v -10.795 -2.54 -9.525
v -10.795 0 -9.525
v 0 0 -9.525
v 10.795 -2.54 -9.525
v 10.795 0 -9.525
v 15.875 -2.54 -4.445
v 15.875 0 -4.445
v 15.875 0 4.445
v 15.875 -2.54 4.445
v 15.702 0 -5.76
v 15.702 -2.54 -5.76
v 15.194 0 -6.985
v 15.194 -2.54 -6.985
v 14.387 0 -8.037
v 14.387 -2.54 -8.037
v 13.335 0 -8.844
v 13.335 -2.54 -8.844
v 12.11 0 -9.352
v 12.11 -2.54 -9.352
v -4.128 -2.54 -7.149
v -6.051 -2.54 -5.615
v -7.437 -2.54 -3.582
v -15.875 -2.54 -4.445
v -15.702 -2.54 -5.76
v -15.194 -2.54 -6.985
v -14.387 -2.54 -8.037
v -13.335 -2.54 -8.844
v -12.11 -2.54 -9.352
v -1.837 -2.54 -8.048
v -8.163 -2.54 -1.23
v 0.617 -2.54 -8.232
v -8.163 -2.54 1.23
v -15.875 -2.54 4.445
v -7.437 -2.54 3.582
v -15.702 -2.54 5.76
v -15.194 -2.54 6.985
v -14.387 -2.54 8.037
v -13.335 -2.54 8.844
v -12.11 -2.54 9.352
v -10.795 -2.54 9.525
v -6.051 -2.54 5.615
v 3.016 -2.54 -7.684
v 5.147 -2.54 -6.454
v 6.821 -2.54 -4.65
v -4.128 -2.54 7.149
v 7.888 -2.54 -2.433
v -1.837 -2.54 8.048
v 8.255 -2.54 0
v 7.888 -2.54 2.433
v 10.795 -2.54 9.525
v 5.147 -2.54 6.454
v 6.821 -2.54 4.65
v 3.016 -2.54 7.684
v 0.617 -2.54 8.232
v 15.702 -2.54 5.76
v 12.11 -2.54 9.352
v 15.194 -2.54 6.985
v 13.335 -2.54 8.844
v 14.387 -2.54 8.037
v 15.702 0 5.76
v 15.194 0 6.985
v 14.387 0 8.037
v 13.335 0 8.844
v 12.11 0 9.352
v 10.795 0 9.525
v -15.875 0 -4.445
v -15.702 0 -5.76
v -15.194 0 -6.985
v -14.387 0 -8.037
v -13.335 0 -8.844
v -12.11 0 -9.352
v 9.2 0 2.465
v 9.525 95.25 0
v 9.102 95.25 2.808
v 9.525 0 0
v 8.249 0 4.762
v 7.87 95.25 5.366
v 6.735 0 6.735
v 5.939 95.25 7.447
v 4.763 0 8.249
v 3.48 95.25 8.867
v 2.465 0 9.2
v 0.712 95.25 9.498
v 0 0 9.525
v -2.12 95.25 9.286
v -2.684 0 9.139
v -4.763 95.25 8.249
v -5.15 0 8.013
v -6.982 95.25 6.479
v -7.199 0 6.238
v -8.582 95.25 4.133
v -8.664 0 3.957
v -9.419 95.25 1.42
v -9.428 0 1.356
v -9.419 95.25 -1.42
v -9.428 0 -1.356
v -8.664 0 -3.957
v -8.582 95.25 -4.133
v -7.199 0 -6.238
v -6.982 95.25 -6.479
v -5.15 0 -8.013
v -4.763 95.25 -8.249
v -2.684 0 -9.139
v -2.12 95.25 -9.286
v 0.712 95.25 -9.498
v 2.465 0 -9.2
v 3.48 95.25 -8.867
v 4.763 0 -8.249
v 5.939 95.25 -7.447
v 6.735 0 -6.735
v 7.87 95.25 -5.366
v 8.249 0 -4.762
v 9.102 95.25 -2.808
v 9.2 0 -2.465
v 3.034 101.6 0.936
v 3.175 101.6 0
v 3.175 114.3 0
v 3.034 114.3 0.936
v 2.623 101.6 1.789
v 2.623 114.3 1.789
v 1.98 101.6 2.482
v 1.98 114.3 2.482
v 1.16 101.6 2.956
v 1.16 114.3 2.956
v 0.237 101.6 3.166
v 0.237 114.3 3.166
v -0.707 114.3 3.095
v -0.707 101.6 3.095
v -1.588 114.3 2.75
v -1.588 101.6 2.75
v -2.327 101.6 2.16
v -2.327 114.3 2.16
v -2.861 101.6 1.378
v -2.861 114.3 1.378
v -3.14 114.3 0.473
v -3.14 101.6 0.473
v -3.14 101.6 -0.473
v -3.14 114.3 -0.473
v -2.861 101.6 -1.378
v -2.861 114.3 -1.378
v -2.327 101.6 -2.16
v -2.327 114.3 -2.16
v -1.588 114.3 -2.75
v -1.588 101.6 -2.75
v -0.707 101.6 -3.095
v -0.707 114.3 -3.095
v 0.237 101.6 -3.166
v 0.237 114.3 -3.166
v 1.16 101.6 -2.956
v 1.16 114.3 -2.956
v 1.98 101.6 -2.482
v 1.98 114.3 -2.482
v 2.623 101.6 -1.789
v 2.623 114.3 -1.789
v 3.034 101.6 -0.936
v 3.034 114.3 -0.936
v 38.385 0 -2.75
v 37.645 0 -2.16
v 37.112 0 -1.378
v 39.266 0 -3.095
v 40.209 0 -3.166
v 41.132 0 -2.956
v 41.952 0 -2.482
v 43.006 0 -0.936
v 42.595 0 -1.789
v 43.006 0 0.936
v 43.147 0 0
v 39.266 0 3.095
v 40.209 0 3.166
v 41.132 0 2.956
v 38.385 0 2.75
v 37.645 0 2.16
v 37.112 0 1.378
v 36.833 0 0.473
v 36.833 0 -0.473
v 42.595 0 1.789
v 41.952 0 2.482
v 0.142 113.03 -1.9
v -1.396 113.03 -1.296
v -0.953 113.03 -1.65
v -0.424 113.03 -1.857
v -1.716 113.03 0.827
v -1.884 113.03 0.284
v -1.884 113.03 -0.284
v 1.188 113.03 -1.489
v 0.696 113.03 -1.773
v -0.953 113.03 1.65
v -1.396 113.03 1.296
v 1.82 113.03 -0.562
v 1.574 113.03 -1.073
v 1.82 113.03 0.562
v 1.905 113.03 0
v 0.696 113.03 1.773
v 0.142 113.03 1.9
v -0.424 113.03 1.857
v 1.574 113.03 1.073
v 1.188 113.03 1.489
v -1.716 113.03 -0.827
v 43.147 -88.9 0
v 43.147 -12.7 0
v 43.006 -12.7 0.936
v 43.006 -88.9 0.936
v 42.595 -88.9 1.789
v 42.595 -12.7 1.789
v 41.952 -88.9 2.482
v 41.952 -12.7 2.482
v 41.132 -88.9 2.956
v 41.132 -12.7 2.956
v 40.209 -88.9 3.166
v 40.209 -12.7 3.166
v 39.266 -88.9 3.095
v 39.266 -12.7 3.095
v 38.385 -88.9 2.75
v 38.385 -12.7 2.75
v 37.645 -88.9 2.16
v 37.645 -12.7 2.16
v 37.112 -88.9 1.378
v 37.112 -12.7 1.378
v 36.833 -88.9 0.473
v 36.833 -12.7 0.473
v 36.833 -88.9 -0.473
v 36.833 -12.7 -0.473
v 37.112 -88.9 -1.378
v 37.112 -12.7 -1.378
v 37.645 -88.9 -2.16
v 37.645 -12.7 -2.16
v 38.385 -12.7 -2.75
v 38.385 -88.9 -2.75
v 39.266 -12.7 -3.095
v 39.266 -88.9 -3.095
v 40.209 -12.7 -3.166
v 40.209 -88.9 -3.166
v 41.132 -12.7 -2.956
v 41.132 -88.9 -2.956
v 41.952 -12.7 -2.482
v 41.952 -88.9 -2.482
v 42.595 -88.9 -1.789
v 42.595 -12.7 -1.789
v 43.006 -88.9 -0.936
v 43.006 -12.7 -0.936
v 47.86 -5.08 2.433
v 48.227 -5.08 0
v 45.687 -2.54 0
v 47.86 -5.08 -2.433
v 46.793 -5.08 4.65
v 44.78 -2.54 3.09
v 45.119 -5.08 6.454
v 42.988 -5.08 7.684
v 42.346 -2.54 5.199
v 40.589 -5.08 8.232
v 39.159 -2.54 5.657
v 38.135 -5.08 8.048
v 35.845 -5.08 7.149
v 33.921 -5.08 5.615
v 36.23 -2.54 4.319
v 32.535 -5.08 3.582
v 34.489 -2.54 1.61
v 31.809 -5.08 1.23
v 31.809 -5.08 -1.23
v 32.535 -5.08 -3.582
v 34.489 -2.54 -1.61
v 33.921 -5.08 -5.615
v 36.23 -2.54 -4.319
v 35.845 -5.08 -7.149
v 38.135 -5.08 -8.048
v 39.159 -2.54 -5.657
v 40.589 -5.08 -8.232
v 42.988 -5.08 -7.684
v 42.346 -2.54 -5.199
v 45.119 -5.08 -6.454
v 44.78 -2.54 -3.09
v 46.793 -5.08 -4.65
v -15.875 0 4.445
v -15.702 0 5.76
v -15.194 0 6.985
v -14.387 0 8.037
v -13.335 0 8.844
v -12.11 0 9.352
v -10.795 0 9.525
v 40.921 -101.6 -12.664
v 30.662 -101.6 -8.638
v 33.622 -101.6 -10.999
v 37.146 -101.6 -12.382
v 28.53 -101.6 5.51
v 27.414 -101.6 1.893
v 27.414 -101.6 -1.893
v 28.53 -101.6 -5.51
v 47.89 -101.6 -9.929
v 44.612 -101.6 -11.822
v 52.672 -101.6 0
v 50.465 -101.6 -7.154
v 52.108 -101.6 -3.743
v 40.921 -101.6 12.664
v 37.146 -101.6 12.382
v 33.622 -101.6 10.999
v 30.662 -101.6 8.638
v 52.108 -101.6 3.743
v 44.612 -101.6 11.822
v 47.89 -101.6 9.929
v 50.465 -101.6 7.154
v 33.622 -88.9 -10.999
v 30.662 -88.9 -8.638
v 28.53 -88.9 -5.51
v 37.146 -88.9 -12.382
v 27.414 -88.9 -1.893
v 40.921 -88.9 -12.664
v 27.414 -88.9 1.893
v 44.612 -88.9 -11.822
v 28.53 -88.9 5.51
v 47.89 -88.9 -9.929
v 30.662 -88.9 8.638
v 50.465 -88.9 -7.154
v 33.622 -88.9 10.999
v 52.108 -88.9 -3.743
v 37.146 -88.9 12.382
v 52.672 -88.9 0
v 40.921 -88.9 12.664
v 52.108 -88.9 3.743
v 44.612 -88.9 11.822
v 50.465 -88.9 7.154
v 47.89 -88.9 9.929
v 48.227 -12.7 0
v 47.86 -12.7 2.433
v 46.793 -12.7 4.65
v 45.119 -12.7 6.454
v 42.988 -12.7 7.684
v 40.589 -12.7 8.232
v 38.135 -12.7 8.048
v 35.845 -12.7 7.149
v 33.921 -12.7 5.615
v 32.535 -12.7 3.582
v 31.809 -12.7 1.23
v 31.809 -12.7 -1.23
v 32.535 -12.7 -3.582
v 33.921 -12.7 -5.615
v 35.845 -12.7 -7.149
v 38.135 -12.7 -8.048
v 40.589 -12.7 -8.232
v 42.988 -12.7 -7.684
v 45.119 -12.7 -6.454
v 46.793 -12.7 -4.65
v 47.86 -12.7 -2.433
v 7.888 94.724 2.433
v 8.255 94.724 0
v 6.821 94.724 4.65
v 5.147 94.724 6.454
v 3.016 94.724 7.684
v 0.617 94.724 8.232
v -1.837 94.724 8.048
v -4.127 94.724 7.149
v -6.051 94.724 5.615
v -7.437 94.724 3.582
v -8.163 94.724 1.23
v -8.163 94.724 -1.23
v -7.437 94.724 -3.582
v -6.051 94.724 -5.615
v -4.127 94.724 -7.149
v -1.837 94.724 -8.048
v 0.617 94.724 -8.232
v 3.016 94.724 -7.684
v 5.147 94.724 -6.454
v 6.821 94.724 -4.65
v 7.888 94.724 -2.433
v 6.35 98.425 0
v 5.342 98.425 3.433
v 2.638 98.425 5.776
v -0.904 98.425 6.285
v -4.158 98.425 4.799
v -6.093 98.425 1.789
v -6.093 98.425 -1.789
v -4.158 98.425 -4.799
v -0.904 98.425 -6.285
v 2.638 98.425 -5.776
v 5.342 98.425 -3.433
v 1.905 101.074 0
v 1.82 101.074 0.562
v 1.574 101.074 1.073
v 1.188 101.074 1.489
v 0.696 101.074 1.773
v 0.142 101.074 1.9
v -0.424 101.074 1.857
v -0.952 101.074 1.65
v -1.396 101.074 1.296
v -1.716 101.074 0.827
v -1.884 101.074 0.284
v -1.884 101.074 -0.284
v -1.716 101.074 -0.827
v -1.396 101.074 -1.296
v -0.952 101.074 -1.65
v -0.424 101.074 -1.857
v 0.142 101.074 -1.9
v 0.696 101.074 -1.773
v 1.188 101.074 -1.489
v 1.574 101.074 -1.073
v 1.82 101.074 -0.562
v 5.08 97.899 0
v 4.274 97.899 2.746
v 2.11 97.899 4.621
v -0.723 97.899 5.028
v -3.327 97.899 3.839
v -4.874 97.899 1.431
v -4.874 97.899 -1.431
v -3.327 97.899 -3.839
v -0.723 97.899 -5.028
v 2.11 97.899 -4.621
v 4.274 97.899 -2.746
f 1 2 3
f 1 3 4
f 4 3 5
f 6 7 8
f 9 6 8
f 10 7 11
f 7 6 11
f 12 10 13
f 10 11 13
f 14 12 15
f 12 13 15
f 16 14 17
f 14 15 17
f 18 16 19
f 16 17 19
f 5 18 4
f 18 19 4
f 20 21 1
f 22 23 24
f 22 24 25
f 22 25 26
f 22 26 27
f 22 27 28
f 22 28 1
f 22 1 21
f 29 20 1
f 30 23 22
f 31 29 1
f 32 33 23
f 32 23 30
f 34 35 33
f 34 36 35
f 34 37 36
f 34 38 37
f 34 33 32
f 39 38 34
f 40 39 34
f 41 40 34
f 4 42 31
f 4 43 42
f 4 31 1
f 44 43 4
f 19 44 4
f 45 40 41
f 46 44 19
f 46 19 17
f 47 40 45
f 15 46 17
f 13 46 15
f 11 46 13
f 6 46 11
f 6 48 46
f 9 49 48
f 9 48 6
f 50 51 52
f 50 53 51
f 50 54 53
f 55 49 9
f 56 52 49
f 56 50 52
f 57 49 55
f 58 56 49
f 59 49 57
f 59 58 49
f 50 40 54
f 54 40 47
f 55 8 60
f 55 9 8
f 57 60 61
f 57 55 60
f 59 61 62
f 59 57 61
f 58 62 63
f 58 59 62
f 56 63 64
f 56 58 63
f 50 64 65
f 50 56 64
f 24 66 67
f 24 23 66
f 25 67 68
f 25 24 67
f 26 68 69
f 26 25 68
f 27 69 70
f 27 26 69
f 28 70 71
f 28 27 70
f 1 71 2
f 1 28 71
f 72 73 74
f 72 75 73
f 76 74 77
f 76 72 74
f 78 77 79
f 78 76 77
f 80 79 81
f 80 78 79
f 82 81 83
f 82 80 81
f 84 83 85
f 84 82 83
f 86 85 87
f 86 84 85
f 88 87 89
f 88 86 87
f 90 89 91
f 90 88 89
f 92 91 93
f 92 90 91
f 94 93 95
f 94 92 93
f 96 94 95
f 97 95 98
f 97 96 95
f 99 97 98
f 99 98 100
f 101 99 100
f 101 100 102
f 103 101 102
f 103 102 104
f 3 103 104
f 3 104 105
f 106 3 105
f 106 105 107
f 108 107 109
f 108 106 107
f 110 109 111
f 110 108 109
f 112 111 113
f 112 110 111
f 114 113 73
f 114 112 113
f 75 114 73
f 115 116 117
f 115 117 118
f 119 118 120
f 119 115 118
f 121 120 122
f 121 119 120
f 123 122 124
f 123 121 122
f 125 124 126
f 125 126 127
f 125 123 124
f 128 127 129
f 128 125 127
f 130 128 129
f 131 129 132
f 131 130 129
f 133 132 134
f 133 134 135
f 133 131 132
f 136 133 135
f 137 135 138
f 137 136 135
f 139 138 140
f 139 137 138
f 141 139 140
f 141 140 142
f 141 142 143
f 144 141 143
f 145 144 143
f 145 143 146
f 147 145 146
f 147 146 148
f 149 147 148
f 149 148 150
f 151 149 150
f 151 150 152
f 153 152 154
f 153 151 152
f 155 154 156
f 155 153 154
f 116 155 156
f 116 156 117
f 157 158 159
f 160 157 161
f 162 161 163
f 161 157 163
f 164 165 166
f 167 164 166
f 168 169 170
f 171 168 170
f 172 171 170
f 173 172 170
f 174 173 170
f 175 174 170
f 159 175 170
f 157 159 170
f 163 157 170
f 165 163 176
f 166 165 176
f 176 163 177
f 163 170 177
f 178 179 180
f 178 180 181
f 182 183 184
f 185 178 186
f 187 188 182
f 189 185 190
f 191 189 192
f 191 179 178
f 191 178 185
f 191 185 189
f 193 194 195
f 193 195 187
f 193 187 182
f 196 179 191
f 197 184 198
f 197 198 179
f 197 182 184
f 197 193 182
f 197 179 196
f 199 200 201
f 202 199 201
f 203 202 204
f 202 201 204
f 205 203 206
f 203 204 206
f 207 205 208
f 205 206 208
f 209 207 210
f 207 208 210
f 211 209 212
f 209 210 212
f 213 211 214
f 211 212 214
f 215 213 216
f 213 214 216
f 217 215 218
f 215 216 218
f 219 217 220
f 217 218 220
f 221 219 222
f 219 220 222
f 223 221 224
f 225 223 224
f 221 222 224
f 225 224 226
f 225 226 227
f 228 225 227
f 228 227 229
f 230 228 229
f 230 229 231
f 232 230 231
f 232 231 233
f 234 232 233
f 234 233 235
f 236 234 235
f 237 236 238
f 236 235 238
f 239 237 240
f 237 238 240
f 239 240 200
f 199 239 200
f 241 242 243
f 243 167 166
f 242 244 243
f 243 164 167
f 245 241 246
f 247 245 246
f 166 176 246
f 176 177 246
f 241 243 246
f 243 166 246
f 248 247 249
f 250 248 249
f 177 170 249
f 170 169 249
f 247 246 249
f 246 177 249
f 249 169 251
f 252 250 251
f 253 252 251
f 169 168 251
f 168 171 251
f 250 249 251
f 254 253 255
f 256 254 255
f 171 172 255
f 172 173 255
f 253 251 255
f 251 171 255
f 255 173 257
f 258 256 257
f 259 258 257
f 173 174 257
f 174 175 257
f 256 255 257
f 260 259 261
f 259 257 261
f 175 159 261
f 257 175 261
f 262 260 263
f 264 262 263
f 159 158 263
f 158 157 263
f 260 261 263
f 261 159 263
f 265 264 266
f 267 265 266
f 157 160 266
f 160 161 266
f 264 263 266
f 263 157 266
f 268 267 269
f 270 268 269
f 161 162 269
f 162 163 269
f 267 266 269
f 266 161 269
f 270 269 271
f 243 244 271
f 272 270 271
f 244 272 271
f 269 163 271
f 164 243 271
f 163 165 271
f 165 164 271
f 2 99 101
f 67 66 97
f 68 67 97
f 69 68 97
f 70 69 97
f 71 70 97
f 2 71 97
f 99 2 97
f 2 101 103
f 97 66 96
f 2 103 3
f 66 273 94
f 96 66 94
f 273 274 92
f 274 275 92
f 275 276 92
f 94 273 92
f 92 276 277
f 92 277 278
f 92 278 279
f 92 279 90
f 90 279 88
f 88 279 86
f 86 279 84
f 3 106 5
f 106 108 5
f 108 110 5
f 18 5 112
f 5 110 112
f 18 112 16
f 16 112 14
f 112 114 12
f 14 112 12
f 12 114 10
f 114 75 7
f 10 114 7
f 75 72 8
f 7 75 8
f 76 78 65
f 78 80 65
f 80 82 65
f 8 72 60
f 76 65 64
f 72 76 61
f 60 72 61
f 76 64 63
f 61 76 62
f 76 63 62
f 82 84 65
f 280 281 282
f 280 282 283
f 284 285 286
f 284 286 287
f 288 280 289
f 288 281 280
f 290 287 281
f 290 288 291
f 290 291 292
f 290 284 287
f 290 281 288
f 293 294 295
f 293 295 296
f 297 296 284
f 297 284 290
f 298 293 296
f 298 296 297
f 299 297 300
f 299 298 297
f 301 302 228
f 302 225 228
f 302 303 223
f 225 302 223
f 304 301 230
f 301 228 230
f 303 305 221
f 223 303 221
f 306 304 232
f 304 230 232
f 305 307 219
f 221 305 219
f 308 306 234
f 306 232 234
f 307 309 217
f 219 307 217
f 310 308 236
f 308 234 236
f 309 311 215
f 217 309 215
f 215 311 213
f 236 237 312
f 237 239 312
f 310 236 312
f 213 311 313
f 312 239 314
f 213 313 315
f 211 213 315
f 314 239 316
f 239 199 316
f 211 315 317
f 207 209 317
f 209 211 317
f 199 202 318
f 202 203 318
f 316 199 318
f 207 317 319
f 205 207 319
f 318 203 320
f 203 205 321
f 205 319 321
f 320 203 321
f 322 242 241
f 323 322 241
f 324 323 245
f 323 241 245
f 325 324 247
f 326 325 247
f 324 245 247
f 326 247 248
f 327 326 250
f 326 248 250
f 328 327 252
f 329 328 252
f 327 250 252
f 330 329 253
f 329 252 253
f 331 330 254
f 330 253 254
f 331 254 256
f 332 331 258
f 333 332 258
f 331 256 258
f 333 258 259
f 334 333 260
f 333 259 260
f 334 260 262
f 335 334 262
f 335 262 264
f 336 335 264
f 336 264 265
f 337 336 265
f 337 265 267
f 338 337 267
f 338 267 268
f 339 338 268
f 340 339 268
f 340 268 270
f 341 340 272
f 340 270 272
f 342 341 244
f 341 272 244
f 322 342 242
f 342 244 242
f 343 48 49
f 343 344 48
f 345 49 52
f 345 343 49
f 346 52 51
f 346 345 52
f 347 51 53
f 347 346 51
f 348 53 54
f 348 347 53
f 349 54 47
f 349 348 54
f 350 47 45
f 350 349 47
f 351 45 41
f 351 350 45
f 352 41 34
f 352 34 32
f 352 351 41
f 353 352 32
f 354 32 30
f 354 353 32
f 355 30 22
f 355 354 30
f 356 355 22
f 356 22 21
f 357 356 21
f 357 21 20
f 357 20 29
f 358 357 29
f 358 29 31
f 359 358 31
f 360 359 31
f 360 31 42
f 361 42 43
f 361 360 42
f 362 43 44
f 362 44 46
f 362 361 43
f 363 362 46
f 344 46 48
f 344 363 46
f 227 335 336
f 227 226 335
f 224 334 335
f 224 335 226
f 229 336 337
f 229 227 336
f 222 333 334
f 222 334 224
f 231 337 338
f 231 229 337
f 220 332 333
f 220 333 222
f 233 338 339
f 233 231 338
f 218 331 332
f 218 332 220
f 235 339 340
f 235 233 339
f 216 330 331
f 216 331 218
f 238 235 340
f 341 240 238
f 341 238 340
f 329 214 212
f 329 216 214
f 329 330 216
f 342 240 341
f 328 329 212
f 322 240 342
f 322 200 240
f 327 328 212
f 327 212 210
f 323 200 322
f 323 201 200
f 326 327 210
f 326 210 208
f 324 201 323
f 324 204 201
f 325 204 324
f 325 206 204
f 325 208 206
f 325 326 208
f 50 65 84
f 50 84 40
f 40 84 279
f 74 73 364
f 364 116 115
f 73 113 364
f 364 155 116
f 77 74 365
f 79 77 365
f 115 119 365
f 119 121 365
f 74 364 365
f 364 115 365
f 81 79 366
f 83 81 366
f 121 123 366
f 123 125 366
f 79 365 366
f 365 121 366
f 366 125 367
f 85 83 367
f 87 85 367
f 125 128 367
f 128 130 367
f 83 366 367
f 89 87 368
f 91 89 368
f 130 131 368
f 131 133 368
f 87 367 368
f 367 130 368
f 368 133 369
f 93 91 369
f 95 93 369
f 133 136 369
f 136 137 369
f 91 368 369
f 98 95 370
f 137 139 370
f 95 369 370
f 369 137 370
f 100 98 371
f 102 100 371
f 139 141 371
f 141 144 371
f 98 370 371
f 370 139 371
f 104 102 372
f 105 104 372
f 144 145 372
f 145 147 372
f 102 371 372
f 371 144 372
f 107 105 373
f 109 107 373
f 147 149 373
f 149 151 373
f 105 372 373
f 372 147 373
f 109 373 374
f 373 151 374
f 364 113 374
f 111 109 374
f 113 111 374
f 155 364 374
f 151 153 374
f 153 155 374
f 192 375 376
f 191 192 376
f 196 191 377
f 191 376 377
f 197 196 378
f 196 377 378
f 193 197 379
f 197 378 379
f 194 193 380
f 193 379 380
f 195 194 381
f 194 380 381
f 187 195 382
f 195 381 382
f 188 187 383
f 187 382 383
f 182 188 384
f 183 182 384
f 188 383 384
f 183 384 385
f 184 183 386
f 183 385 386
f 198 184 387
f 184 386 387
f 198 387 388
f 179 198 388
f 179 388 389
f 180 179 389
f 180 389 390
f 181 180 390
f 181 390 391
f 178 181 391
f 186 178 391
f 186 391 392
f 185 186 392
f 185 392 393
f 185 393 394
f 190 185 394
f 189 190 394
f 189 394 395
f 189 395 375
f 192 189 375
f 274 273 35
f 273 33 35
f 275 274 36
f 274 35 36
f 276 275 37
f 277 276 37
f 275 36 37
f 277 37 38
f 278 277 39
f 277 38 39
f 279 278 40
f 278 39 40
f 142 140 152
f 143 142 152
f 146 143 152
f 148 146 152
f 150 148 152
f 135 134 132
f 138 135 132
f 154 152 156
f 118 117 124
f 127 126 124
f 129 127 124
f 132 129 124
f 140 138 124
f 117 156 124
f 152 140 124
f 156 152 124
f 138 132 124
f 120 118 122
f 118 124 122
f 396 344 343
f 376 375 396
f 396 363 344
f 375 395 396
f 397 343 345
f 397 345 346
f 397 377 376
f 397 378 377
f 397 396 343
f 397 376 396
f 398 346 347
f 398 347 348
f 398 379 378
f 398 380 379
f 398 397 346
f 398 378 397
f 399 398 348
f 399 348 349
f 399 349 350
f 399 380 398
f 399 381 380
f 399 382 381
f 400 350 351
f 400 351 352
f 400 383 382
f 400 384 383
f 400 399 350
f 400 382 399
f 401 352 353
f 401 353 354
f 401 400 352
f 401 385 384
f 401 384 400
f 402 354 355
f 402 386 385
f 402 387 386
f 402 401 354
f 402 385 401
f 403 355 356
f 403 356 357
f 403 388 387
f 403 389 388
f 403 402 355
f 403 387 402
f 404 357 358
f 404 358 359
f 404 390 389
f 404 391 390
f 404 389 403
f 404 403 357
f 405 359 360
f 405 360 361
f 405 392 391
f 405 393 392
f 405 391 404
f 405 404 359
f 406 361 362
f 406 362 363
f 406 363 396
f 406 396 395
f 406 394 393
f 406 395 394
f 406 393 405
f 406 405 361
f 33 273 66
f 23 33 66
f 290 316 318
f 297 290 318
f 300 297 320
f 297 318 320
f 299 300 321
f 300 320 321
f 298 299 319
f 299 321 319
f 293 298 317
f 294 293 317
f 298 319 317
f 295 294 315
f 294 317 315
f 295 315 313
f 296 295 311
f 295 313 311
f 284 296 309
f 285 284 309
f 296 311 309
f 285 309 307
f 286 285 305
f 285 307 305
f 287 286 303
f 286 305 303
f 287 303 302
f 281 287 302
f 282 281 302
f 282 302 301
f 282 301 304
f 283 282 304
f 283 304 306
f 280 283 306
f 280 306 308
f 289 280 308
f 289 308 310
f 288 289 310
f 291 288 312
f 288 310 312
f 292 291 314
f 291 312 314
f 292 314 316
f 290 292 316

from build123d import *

# Parameters (mm, degrees)
F0_R      = 9.525
F1_DEPTH  = 101.6
F2_SIZE   = 6.35
F3_DEPTH  = 12.7
F4_T      = -1.27
F5_R      = 8.255
F6_DEPTH  = 2.54
F7_R      = 5.08
F8_R      = 8.255
F9_DEPTH  = 12.7
F10_R     = 3.175
F11_DEPTH = 76.2
F12_R     = 12.7
F12_R_2   = 3.175
F13_DEPTH = 12.7
F14_SIZE  = 5.08


with BuildPart() as f1:
    # F0 (on Front) → F1 (new body)
    with BuildSketch(Plane.XZ):
        Circle(F0_R)
    extrude(amount=-F1_DEPTH)

    # F2
    f2_edges = [f1.edges().sort_by_distance(p)[0] for p in [
        (-9.525, 101.6, 0),
    ]]
    chamfer(f2_edges, length=F2_SIZE)

    # F3 (add): a face of the model
    f3_faces = [f1.faces().sort_by_distance(p)[0] for p in [
        (0, 101.6, 0),
    ]]
    extrude(f3_faces, amount=F3_DEPTH)

    # F4
    f4_openings = [f1.faces().sort_by_distance(p)[0] for p in [
        (0, 0, 0),
    ]]
    offset(amount=F4_T, openings=f4_openings, kind=Kind.INTERSECTION)

    # F5 (on face) → F6 (join)
    with BuildSketch(Plane.XZ):
        with BuildLine():
            Line((0, 9.525), (-15.875, 9.525))
            Line((-15.875, 9.525), (-15.875, -9.525))
            Line((-15.875, -9.525), (0, -9.525))
            ThreePointArc((0, -9.525), (-9.525, 0), (0, 9.525))
        make_face()
        with BuildLine():
            Line((15.875, 9.525), (0, 9.525))
            ThreePointArc((0, 9.525), (6.7351920908, 6.7351920908), (9.525, 0))
            ThreePointArc((9.525, 0), (6.7351920908, -6.7351920908), (0, -9.525))
            Line((0, -9.525), (15.875, -9.525))
            Line((15.875, -9.525), (15.875, 9.525))
        make_face()
        with BuildLine():
            ThreePointArc((9.525, 0), (6.7351920908, 6.7351920908), (0, 9.525))
            ThreePointArc((0, 9.525), (-9.525, 0), (0, -9.525))
            ThreePointArc((0, -9.525), (6.7351920908, -6.7351920908), (9.525, 0))
        make_face()
        Circle(F5_R, mode=Mode.SUBTRACT)
    extrude(amount=F6_DEPTH)

    # F7
    f7_edges = [f1.edges().sort_by_distance(p)[0] for p in [
        (-15.875, -1.27, 9.525),
        (15.875, -1.27, 9.525),
        (15.875, -1.27, -9.525),
        (-15.875, -1.27, -9.525),
    ]]
    fillet(f7_edges, radius=F7_R)


with BuildPart() as f9:
    # F8 (on Front) → F9 (new body)
    with BuildSketch(Plane.XZ):
        with Locations((39.9721178575, 0)):
            Circle(F8_R)
    extrude(amount=F9_DEPTH)

    # F10 (on face) → F11 (join)
    with BuildSketch(Plane.XZ.offset(12.7)):
        with Locations((39.9721178575, 0)):
            Circle(F10_R)
    extrude(amount=F11_DEPTH)

    # F12 (on face) → F13 (join)
    with BuildSketch(Plane.XZ.offset(88.9)):
        with Locations((39.9721178575, 0)):
            Circle(F12_R)
        with Locations((39.9721178575, 0)):
            Circle(F12_R_2, mode=Mode.SUBTRACT)
        with Locations((39.9721178575, 0)):
            Circle(F12_R_2)
    extrude(amount=F13_DEPTH)

    # F14
    f14_edges = [f9.edges().sort_by_distance(p)[0] for p in [
        (31.717118, 0, 0),
    ]]
    chamfer(f14_edges, length=F14_SIZE)


solid = Compound([f1.part, f9.part])
